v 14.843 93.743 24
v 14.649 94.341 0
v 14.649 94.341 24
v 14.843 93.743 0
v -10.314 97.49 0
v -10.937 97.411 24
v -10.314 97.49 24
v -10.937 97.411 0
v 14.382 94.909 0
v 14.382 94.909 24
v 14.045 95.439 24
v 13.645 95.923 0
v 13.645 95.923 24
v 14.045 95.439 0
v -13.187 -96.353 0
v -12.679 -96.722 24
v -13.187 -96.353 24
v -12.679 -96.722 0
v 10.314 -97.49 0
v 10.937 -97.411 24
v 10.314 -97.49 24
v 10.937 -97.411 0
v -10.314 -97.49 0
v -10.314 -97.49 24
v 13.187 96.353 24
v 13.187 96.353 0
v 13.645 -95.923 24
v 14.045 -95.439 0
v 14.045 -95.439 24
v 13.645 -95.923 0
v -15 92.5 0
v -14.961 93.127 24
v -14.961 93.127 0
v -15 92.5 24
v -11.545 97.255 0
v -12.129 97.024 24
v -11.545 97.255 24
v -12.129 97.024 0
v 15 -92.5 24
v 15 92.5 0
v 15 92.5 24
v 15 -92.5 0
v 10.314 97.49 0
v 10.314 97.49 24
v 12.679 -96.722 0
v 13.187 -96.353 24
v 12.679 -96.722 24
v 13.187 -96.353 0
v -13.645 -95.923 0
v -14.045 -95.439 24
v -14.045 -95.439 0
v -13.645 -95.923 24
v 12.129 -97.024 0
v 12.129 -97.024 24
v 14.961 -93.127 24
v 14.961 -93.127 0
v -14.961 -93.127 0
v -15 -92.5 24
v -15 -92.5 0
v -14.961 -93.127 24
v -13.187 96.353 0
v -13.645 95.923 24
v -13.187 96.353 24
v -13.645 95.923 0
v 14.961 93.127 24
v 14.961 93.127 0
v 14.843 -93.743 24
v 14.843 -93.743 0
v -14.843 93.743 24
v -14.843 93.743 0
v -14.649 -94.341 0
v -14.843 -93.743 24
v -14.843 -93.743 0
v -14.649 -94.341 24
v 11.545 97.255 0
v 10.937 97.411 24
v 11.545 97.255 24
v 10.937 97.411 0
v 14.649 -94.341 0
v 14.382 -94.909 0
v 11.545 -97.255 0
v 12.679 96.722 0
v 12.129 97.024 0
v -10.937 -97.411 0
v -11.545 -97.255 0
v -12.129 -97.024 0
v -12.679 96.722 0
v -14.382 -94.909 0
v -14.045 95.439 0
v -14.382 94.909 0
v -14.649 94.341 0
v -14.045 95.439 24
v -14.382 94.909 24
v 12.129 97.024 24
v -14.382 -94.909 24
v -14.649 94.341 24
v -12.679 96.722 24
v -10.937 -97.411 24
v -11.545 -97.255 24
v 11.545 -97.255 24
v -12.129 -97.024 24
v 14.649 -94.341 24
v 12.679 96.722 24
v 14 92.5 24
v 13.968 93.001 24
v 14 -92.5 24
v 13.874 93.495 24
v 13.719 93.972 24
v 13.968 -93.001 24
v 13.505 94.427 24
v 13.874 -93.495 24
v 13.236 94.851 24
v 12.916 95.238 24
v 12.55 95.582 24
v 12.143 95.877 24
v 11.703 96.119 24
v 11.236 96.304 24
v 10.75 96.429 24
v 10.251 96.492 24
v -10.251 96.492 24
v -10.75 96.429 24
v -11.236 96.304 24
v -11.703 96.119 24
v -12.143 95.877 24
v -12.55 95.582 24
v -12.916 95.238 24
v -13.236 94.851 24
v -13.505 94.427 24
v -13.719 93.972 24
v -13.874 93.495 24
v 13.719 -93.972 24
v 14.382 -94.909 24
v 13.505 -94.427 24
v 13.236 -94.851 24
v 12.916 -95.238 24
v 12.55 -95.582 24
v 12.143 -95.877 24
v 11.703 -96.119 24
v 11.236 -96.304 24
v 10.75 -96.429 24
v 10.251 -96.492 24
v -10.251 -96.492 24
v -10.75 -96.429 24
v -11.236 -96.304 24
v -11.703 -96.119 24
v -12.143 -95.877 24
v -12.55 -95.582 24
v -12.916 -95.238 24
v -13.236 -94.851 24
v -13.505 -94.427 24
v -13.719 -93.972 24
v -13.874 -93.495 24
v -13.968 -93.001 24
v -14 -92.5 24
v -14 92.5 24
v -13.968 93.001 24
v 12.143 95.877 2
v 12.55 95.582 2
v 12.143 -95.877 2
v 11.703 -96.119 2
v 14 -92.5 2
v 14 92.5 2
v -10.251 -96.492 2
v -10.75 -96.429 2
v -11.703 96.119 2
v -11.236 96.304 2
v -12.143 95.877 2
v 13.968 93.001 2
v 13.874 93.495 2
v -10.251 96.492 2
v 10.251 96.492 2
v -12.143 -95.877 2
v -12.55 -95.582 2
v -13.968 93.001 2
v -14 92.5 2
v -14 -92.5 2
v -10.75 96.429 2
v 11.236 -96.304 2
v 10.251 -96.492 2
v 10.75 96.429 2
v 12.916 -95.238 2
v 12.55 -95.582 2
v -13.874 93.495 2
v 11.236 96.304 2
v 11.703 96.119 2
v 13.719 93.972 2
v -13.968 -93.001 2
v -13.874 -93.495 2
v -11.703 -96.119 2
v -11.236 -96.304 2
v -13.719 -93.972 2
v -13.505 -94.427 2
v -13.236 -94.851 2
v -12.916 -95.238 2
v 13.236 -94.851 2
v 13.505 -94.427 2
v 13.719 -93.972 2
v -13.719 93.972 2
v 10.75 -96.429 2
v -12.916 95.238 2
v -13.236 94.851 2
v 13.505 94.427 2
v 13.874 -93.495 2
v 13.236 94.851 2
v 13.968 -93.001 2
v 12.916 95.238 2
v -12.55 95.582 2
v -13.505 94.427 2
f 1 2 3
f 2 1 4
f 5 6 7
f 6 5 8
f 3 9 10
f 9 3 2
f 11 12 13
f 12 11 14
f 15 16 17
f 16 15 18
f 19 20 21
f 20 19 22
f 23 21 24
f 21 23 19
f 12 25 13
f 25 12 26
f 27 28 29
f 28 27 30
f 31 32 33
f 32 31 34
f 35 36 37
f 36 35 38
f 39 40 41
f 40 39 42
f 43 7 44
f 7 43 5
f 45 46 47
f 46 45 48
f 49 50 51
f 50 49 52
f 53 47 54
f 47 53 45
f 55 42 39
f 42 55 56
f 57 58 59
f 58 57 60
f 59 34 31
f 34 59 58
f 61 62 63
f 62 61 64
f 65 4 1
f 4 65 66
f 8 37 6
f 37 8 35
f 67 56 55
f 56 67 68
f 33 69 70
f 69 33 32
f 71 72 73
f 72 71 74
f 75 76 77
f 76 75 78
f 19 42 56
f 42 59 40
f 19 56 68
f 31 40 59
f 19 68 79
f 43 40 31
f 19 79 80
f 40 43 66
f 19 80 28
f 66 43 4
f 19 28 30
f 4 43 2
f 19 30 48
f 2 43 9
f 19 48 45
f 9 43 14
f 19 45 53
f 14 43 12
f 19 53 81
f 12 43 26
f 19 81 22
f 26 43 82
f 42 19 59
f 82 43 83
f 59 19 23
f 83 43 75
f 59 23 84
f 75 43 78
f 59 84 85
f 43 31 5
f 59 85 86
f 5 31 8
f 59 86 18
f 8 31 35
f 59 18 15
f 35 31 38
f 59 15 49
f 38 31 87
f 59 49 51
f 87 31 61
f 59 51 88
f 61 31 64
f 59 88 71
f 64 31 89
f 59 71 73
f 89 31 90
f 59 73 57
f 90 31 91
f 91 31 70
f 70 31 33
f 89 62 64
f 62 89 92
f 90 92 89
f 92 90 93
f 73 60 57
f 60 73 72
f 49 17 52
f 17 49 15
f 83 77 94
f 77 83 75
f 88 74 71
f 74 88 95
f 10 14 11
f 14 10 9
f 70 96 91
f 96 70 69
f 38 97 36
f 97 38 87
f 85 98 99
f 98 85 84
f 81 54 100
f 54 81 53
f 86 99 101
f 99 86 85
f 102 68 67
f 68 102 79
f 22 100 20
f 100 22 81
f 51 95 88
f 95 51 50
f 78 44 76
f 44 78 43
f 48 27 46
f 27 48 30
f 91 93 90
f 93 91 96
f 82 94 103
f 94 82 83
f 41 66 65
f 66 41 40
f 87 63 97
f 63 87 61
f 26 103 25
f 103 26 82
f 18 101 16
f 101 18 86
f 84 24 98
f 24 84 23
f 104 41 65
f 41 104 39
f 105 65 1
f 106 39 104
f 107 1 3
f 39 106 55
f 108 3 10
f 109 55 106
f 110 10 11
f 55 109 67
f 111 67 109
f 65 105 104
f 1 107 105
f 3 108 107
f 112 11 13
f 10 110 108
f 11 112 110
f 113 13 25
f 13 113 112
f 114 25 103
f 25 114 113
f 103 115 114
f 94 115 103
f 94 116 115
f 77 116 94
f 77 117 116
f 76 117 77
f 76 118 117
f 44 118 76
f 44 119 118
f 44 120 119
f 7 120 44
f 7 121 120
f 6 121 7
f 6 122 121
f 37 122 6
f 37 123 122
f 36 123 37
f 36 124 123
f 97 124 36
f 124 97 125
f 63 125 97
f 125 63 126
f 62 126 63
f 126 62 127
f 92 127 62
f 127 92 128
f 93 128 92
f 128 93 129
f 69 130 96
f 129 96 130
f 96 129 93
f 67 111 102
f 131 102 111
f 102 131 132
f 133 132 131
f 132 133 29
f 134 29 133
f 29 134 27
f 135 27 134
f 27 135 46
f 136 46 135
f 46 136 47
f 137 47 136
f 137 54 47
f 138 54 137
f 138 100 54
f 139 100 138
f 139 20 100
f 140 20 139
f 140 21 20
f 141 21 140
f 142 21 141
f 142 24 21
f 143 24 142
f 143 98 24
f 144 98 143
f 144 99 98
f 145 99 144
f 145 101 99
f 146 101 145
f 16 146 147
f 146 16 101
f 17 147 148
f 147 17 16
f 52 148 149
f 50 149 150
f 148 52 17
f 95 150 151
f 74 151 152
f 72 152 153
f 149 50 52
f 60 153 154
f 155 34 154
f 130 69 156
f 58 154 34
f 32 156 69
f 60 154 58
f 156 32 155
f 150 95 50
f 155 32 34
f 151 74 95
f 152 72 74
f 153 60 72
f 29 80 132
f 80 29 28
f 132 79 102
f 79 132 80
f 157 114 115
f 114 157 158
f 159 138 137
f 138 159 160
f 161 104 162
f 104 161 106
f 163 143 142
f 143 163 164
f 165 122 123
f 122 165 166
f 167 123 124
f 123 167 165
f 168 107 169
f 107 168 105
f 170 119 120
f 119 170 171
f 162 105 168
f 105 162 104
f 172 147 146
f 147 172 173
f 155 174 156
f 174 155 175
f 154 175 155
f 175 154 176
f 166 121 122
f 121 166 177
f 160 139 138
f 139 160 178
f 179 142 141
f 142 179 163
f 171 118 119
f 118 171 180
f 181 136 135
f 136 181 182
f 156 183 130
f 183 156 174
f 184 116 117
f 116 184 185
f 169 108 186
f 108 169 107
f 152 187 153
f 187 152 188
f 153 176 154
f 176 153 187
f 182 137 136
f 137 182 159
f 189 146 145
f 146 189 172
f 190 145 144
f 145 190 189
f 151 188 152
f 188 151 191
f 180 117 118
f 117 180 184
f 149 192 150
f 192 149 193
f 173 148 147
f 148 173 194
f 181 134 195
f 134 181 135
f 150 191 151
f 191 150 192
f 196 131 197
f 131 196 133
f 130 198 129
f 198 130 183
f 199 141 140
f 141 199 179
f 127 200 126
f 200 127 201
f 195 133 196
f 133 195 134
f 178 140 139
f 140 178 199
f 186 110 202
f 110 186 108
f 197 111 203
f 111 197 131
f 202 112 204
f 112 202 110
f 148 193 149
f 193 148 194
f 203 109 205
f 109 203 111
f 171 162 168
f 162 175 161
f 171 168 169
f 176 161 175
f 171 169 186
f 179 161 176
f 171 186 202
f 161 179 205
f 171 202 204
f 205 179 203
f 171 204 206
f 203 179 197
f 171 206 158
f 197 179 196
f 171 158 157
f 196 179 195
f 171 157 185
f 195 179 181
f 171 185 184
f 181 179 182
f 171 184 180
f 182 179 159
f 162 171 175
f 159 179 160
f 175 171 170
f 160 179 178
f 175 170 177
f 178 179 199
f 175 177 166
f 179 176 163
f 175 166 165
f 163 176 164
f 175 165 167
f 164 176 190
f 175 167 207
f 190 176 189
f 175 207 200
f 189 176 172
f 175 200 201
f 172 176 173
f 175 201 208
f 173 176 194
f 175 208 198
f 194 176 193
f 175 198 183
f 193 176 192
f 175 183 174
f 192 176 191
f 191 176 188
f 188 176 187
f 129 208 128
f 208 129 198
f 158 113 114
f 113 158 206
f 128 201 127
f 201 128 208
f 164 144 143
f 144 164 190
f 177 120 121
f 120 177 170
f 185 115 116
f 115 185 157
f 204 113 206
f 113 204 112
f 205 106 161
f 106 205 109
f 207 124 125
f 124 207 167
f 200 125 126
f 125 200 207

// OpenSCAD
$fn = 50;


difference() {
	union() {
		hull() {
			translate(v = [-10.0000000000, 92.5000000000, 0]) {
				cylinder(h = 24, r = 5);
			}
			translate(v = [10.0000000000, 92.5000000000, 0]) {
				cylinder(h = 24, r = 5);
			}
			translate(v = [-10.0000000000, -92.5000000000, 0]) {
				cylinder(h = 24, r = 5);
			}
			translate(v = [10.0000000000, -92.5000000000, 0]) {
				cylinder(h = 24, r = 5);
			}
		}
	}
	union() {
		translate(v = [0, 0, 2]) {
			hull() {
				translate(v = [-10.0000000000, 92.5000000000, 0]) {
					cylinder(h = 22, r = 4);
				}
				translate(v = [10.0000000000, 92.5000000000, 0]) {
					cylinder(h = 22, r = 4);
				}
				translate(v = [-10.0000000000, -92.5000000000, 0]) {
					cylinder(h = 22, r = 4);
				}
				translate(v = [10.0000000000, -92.5000000000, 0]) {
					cylinder(h = 22, r = 4);
				}
			}
		}
	}
}
